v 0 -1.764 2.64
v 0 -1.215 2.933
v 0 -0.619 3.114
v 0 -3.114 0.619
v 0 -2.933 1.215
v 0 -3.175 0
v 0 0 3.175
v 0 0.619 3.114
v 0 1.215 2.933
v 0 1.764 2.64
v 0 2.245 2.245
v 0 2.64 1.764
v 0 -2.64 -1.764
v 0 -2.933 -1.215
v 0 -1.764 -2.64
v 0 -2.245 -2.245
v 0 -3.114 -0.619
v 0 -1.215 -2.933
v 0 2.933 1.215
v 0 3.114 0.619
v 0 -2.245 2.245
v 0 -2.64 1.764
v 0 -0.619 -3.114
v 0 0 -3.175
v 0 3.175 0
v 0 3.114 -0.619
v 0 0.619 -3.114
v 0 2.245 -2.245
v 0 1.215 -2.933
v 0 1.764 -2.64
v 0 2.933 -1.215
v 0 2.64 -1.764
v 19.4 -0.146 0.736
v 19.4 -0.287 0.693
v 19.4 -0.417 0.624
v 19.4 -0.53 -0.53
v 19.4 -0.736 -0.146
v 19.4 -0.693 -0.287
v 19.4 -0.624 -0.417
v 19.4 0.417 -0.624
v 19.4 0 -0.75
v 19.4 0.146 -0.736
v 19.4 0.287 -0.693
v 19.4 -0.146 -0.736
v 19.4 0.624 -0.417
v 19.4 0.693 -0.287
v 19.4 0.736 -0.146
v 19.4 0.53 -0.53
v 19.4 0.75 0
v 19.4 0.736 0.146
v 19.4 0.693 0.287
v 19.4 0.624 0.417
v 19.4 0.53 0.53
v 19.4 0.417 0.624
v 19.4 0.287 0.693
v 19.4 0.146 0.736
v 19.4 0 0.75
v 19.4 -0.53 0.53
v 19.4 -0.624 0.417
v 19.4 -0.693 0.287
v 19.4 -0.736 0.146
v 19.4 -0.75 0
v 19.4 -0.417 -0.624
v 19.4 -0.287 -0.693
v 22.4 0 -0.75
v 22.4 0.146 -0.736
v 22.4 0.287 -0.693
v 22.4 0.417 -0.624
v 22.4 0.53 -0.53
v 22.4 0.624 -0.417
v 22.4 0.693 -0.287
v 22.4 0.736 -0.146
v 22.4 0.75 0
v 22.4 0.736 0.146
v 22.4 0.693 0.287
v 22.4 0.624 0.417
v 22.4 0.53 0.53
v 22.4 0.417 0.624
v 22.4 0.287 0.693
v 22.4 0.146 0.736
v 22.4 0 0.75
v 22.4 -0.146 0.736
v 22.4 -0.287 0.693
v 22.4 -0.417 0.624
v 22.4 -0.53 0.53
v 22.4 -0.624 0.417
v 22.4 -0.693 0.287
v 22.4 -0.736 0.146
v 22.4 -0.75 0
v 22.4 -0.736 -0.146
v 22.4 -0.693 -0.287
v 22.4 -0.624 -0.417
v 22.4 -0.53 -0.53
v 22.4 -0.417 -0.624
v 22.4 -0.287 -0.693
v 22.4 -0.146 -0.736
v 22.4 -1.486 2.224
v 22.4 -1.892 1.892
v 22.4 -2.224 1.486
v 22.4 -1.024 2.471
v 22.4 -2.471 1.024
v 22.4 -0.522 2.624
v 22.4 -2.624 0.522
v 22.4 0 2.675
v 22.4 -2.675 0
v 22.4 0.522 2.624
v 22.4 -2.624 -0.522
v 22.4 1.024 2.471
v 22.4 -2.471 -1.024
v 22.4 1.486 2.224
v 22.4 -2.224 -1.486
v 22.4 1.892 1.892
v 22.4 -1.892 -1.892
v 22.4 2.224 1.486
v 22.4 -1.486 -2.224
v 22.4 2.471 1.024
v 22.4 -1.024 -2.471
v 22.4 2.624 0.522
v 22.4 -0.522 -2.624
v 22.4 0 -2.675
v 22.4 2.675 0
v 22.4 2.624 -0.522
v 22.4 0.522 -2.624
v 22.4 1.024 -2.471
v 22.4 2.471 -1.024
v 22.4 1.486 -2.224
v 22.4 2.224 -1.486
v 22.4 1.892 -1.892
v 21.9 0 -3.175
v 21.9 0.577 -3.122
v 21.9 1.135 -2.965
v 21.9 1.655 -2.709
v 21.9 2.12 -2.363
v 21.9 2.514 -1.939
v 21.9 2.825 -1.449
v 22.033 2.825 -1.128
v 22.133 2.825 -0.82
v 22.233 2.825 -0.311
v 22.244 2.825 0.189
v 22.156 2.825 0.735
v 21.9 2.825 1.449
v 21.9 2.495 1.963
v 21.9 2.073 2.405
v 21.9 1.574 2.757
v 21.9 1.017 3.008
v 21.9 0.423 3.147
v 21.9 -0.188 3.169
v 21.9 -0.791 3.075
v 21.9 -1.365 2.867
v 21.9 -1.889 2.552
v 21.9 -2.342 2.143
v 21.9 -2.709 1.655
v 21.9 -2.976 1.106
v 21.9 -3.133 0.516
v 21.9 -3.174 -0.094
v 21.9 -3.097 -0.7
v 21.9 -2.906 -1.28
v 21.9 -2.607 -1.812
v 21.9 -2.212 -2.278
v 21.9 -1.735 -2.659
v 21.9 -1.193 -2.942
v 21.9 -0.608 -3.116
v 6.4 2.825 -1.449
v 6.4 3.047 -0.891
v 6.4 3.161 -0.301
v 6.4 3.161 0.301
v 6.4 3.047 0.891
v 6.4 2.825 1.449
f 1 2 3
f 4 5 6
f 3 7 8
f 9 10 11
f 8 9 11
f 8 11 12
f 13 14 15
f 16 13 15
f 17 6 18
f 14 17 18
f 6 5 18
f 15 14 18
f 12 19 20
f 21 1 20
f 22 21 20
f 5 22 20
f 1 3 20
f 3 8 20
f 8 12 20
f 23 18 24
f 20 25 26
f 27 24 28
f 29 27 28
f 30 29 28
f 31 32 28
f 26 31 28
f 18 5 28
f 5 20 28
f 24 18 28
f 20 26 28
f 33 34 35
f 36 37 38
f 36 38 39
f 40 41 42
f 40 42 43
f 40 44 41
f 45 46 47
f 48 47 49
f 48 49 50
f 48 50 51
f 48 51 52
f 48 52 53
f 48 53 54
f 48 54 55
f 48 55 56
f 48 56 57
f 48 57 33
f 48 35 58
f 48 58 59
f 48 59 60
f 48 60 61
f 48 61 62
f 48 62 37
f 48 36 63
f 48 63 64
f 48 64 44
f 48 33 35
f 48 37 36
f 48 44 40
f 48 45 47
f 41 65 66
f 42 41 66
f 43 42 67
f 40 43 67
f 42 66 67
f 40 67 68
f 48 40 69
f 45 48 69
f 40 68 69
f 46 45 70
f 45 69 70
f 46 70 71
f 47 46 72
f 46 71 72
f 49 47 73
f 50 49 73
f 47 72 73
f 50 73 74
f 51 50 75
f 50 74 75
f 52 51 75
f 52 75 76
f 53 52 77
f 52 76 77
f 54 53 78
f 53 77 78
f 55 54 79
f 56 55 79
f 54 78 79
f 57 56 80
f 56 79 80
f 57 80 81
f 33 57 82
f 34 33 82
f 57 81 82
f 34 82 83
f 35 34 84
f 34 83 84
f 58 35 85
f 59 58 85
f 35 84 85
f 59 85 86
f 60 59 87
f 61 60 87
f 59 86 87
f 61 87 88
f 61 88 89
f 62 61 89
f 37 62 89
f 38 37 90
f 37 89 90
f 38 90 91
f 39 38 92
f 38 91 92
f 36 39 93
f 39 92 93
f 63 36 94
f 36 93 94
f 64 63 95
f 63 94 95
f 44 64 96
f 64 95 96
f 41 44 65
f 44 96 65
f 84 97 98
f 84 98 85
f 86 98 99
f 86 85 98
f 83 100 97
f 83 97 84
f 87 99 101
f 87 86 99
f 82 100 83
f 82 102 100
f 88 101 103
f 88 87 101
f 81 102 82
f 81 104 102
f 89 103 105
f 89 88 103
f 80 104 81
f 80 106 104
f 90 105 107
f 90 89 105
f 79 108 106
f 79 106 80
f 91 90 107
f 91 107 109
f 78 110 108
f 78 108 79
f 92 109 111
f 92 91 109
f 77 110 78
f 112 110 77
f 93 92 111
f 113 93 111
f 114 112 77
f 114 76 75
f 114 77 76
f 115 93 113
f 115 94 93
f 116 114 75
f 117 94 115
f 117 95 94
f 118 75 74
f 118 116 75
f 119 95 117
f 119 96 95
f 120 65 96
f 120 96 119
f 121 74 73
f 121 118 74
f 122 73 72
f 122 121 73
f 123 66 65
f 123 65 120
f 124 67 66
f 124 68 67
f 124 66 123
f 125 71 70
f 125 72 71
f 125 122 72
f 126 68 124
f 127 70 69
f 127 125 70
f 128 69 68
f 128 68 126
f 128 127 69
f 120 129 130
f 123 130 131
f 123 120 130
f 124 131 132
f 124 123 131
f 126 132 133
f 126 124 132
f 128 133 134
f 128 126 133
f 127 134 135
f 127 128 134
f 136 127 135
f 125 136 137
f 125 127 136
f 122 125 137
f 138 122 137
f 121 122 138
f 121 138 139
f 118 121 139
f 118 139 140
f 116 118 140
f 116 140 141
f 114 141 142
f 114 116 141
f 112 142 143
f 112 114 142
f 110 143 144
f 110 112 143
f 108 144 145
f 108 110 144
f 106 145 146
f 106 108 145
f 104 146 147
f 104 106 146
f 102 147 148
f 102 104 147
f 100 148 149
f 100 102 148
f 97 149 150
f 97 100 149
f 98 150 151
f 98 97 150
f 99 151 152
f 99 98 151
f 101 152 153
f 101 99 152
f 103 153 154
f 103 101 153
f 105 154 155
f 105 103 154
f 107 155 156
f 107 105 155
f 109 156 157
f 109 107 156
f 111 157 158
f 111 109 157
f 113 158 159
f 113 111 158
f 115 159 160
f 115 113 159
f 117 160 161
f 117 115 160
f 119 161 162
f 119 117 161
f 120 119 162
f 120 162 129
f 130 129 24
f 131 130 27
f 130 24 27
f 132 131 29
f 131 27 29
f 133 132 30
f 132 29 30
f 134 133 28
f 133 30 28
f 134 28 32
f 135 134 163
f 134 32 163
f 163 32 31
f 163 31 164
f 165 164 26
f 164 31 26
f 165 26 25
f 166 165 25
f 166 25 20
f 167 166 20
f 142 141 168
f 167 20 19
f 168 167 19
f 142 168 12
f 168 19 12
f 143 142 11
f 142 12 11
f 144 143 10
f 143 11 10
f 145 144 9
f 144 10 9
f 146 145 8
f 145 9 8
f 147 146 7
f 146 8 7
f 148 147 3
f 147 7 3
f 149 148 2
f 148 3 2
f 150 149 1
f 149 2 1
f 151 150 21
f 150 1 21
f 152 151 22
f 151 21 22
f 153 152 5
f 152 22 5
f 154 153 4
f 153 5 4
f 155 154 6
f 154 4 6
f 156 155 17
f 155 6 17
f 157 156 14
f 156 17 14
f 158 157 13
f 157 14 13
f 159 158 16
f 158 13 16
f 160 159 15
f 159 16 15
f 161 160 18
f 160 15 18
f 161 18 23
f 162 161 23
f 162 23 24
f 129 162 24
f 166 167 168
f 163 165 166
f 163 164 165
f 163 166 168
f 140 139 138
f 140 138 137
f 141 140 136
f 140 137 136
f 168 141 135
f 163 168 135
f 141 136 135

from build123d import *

# Parameters (mm, degrees)
ESBO_O1_R                = 3.175
RESSALTO_EXTRUS_O1_DEPTH = 22.4
CHANFRO1_SIZE            = 0.5
ESBO_O3_W                = 2.89827535
ESBO_O3_H                = 0.35
CORTE_EXTRUS_O1_DEPTH    = 16
ESBO_O4_R                = 0.75
CORTE_EXTRUS_O2_DEPTH    = 3


with BuildPart() as part:
    # Esboço1 → Ressalto-extrusão1 (new body)
    with BuildSketch(Plane(origin=(0, 0, 0), x_dir=(0, 0, -1), z_dir=(1, 0, 0))):
        Circle(ESBO_O1_R)
    extrude(amount=RESSALTO_EXTRUS_O1_DEPTH)

    # Chanfro1
    chanfro1_edges = [part.edges().sort_by_distance(p)[0] for p in [
        (22.4, 0, 3.175),
    ]]
    chamfer(chanfro1_edges, length=CHANFRO1_SIZE)

    # Esboço3 → Corte-extrusão1 (cut)
    with BuildSketch(Plane(origin=(22.4, 0, 0), x_dir=(0, 0, -1), z_dir=(1, 0, 0))):
        with Locations((0, 3)):
            Rectangle(ESBO_O3_W, ESBO_O3_H)
    extrude(amount=-CORTE_EXTRUS_O1_DEPTH, mode=Mode.SUBTRACT)

    # Esboço4 → Corte-extrusão2 (cut)
    with BuildSketch(Plane(origin=(22.4, 0, 0), x_dir=(0, 0, -1), z_dir=(1, 0, 0))):
        Circle(ESBO_O4_R)
    extrude(amount=-CORTE_EXTRUS_O2_DEPTH, mode=Mode.SUBTRACT)


solid = part.part
